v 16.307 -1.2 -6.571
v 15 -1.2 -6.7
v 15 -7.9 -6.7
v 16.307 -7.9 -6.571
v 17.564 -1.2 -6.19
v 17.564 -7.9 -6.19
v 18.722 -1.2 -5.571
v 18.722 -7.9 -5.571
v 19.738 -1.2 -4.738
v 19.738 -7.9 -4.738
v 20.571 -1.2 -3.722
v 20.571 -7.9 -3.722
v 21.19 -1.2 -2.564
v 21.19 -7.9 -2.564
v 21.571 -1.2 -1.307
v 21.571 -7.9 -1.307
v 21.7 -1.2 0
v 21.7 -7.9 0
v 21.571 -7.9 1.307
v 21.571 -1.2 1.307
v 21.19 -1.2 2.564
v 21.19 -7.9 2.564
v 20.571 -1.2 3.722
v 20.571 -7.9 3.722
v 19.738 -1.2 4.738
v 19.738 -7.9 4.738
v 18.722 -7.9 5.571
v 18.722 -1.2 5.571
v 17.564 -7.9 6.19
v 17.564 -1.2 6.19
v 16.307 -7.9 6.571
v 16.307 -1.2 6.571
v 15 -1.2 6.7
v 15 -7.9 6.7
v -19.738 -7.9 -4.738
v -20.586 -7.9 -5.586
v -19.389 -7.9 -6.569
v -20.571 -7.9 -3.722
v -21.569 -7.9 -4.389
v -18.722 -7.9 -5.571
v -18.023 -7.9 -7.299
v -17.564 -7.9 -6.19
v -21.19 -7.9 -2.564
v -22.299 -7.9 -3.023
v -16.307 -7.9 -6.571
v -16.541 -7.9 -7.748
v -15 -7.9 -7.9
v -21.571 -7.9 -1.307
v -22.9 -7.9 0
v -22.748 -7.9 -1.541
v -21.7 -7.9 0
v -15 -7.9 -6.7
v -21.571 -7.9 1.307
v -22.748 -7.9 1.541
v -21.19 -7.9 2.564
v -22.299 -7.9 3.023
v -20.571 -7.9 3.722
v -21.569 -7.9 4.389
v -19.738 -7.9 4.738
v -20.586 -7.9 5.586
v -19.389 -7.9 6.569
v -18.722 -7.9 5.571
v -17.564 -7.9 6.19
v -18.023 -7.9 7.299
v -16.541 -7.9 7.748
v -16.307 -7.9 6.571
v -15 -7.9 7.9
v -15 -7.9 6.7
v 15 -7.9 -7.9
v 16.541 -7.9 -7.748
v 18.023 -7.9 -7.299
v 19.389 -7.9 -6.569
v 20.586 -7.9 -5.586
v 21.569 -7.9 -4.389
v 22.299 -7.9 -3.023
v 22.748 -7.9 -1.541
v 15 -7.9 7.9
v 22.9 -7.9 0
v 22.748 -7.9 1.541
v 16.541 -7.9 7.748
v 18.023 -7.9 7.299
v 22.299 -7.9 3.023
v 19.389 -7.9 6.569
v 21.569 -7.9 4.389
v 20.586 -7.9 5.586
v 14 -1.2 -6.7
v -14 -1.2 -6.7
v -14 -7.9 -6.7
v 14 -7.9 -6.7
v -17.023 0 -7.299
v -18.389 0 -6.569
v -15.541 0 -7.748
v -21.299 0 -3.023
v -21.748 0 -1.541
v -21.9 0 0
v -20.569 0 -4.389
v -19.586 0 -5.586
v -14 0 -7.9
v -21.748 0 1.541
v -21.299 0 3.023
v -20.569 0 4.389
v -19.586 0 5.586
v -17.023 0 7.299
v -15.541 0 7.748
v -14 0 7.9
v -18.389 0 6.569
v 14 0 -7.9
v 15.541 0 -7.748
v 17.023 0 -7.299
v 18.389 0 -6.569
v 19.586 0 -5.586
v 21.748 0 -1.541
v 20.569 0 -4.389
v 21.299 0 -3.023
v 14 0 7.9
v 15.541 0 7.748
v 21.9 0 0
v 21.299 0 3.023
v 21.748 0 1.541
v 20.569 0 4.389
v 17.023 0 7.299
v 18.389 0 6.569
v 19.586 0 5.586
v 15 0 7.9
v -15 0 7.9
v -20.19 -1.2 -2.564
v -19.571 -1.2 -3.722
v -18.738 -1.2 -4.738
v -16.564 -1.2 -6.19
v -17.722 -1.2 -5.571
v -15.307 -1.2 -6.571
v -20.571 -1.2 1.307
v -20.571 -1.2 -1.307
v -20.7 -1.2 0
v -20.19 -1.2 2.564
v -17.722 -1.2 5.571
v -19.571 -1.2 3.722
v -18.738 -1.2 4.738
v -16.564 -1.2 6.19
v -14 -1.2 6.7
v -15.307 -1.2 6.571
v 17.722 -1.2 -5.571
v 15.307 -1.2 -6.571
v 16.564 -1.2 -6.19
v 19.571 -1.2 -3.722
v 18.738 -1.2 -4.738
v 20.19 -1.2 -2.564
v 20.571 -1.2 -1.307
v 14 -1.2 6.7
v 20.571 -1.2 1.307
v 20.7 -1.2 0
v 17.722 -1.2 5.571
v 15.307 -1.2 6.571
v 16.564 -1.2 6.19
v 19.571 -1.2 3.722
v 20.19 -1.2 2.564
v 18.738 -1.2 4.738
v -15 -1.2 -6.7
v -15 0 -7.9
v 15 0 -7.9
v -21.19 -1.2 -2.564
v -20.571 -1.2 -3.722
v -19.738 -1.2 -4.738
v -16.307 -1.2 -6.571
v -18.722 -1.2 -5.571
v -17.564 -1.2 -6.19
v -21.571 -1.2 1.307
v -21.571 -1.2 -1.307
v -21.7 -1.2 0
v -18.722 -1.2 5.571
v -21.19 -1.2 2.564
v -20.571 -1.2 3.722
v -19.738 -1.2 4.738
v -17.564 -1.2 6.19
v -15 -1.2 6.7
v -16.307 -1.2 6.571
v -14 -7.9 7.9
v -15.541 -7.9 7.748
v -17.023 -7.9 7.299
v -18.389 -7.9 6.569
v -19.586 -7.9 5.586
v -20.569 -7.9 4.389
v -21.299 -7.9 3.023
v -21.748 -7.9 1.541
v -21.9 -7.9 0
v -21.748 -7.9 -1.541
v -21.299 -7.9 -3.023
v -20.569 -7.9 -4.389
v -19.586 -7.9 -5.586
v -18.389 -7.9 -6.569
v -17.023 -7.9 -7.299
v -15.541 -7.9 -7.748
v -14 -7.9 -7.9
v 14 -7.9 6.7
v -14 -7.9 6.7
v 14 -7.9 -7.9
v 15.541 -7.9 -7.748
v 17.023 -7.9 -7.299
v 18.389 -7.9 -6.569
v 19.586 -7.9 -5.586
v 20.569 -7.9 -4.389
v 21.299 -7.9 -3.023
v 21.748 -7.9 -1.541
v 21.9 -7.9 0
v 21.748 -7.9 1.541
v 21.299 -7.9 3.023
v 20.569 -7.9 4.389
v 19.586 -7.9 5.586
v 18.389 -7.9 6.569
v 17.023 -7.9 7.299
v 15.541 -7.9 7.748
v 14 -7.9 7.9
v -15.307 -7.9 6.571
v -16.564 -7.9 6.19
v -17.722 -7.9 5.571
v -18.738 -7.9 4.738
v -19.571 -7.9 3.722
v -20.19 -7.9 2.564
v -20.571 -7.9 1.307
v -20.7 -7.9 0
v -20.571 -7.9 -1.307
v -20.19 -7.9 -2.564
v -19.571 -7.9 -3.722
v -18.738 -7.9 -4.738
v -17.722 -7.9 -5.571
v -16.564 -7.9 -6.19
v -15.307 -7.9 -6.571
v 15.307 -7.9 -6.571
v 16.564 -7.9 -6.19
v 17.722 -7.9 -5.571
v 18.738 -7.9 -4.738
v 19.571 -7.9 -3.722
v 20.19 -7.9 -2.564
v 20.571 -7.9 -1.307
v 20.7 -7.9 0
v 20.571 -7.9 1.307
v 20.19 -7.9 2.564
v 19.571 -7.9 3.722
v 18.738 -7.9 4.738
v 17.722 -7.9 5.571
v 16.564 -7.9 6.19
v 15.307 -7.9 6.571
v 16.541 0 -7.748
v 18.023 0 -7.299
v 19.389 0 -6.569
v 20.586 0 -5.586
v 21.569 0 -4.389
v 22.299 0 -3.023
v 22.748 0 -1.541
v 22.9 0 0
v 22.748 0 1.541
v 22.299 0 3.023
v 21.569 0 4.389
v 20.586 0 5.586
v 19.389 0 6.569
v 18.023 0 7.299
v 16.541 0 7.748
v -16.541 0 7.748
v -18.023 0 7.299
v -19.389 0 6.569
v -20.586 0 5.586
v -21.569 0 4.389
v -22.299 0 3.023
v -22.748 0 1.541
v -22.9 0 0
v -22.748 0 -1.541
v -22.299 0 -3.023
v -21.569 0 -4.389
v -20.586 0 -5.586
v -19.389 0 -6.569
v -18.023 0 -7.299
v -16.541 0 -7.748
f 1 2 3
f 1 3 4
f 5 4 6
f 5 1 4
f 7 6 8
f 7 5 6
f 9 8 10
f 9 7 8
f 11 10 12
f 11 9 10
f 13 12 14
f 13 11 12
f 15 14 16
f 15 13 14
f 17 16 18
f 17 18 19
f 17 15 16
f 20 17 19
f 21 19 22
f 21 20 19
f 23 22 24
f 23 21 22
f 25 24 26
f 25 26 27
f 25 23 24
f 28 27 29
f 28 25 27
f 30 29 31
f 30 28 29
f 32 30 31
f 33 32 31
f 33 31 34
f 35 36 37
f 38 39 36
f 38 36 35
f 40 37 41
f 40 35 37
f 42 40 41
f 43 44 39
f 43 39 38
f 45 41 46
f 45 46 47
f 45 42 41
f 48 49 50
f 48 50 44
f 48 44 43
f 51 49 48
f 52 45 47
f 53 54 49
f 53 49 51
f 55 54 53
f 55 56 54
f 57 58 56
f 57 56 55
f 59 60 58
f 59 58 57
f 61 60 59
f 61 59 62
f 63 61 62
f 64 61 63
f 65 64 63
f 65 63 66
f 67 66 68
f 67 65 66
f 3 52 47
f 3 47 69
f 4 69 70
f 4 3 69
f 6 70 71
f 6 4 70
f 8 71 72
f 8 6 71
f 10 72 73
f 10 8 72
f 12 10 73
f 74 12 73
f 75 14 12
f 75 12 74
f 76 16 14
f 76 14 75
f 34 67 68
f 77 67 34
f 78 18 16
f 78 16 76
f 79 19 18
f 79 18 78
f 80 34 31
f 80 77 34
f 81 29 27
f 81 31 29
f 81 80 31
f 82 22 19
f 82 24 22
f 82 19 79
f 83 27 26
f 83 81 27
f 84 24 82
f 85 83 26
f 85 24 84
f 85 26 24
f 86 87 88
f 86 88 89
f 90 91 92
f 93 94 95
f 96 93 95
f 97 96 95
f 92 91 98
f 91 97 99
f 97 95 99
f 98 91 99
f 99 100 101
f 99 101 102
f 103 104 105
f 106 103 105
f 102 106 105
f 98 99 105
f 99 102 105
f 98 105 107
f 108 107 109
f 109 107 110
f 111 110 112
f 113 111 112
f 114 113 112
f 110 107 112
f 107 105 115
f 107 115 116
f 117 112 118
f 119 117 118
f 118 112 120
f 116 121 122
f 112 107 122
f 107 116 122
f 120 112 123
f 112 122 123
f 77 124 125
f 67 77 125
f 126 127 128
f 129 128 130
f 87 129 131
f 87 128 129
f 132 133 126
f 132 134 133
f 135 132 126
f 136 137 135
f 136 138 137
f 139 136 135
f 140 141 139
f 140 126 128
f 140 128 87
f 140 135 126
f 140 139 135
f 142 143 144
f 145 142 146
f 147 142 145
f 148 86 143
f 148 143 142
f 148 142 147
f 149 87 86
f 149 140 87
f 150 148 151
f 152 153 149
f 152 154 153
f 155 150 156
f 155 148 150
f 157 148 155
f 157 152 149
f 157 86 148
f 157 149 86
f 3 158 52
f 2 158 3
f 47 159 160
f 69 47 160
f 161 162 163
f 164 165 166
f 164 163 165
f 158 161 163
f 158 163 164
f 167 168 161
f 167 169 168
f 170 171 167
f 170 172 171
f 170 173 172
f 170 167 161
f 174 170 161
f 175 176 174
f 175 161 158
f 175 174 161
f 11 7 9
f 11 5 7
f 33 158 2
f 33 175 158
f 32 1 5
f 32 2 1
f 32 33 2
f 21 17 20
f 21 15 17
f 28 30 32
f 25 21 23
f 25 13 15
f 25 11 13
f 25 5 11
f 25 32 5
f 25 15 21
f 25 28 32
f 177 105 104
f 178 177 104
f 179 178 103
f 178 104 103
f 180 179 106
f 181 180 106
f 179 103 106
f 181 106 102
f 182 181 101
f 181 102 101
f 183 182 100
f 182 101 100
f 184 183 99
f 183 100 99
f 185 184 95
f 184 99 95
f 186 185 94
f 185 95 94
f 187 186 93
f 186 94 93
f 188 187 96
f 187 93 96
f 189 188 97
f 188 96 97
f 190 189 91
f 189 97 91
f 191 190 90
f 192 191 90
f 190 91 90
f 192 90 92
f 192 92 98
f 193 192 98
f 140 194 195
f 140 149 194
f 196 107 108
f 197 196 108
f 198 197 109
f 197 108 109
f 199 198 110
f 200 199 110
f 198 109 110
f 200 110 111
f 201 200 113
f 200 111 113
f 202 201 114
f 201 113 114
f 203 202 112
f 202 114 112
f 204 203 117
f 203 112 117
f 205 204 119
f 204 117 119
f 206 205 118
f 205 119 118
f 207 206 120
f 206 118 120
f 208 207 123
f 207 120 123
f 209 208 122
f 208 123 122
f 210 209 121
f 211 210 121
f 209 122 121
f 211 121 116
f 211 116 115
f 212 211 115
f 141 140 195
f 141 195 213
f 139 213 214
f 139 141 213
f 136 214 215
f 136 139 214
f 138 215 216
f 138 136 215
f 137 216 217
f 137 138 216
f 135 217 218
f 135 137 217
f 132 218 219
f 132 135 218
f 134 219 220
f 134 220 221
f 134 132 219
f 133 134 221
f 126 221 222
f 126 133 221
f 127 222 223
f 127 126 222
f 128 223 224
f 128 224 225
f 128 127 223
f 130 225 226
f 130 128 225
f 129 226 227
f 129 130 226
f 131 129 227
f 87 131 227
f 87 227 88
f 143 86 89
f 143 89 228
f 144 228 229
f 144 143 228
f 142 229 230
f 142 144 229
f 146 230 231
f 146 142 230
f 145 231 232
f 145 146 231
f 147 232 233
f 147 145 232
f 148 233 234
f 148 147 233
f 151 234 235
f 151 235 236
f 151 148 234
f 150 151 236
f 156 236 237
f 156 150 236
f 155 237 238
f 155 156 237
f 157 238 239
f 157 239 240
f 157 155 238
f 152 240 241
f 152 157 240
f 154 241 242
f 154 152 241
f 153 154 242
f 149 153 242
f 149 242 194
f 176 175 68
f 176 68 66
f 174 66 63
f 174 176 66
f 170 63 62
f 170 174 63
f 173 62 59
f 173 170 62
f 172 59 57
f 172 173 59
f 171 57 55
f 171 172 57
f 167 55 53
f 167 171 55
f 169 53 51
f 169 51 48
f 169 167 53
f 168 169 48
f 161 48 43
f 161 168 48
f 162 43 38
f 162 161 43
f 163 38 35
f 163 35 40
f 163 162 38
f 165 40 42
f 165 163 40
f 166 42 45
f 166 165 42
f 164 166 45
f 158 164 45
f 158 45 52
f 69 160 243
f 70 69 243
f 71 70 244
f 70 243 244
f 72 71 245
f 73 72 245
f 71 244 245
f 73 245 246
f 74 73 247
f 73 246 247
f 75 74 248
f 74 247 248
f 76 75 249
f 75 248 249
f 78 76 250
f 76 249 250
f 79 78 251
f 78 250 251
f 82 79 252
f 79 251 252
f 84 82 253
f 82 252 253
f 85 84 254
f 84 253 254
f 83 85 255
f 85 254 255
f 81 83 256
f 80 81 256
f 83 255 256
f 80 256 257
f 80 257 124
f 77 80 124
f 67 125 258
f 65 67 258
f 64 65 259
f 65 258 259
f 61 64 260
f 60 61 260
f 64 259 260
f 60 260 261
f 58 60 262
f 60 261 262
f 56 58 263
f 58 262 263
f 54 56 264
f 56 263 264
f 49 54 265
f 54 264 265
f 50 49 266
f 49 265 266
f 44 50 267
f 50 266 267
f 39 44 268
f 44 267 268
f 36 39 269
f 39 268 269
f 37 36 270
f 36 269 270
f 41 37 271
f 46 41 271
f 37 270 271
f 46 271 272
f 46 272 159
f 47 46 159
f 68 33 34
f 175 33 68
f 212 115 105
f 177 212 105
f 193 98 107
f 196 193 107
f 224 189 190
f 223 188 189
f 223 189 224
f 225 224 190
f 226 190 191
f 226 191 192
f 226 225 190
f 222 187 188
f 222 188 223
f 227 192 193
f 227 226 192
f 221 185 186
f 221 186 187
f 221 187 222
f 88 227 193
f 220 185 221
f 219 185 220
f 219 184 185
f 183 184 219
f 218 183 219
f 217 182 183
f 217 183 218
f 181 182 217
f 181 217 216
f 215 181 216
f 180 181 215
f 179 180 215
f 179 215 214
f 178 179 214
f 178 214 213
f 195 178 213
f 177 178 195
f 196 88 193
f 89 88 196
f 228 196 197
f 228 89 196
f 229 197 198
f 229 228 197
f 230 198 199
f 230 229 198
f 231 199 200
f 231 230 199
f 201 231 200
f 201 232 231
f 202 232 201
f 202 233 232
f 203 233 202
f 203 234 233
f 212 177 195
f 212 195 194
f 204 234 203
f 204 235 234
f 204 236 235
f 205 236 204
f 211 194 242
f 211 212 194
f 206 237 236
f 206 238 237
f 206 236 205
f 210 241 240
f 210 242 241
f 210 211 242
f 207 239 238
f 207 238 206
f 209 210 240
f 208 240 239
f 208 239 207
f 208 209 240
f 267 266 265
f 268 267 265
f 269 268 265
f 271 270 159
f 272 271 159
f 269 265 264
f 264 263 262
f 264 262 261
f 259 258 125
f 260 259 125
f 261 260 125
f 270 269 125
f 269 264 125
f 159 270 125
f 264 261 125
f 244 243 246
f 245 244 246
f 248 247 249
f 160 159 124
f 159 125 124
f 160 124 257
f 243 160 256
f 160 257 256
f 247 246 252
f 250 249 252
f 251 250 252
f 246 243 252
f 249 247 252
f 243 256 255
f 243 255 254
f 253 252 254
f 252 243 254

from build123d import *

# Parameters (mm, degrees)
F1_DEPTH = 7.9
F2_T     = -1.2
F4_DEPTH = 7.9
F5_T     = -1.2


with BuildPart() as f1:
    # F0 (on Front) → F1 (new body)
    with BuildSketch(Plane.XZ):
        with BuildLine():
            ThreePointArc((-14, 7.9), (-21.9, 0), (-14, -7.9))
            Line((-14, -7.9), (14, -7.9))
            ThreePointArc((14, -7.9), (21.9, 0), (14, 7.9))
            Line((14, 7.9), (-14, 7.9))
        make_face()
    extrude(amount=F1_DEPTH)

    # F2
    f2_openings = [f1.faces().sort_by_distance(p)[0] for p in [
        (0, -7.9, 0),
    ]]
    offset(amount=F2_T, openings=f2_openings)


with BuildPart() as f4:
    # F3 (on Front) → F4 (new body)
    with BuildSketch(Plane.XZ):
        with BuildLine():
            ThreePointArc((-15, 7.9), (-22.9, 0), (-15, -7.9))
            Line((-15, -7.9), (15, -7.9))
            ThreePointArc((15, -7.9), (22.9, 0), (15, 7.9))
            Line((15, 7.9), (-15, 7.9))
        make_face()
    extrude(amount=F4_DEPTH)

    # F5
    f5_openings = [f4.faces().sort_by_distance(p)[0] for p in [
        (0, -7.9, 0),
    ]]
    offset(amount=F5_T, openings=f5_openings)


solid = Compound([f1.part, f4.part])
